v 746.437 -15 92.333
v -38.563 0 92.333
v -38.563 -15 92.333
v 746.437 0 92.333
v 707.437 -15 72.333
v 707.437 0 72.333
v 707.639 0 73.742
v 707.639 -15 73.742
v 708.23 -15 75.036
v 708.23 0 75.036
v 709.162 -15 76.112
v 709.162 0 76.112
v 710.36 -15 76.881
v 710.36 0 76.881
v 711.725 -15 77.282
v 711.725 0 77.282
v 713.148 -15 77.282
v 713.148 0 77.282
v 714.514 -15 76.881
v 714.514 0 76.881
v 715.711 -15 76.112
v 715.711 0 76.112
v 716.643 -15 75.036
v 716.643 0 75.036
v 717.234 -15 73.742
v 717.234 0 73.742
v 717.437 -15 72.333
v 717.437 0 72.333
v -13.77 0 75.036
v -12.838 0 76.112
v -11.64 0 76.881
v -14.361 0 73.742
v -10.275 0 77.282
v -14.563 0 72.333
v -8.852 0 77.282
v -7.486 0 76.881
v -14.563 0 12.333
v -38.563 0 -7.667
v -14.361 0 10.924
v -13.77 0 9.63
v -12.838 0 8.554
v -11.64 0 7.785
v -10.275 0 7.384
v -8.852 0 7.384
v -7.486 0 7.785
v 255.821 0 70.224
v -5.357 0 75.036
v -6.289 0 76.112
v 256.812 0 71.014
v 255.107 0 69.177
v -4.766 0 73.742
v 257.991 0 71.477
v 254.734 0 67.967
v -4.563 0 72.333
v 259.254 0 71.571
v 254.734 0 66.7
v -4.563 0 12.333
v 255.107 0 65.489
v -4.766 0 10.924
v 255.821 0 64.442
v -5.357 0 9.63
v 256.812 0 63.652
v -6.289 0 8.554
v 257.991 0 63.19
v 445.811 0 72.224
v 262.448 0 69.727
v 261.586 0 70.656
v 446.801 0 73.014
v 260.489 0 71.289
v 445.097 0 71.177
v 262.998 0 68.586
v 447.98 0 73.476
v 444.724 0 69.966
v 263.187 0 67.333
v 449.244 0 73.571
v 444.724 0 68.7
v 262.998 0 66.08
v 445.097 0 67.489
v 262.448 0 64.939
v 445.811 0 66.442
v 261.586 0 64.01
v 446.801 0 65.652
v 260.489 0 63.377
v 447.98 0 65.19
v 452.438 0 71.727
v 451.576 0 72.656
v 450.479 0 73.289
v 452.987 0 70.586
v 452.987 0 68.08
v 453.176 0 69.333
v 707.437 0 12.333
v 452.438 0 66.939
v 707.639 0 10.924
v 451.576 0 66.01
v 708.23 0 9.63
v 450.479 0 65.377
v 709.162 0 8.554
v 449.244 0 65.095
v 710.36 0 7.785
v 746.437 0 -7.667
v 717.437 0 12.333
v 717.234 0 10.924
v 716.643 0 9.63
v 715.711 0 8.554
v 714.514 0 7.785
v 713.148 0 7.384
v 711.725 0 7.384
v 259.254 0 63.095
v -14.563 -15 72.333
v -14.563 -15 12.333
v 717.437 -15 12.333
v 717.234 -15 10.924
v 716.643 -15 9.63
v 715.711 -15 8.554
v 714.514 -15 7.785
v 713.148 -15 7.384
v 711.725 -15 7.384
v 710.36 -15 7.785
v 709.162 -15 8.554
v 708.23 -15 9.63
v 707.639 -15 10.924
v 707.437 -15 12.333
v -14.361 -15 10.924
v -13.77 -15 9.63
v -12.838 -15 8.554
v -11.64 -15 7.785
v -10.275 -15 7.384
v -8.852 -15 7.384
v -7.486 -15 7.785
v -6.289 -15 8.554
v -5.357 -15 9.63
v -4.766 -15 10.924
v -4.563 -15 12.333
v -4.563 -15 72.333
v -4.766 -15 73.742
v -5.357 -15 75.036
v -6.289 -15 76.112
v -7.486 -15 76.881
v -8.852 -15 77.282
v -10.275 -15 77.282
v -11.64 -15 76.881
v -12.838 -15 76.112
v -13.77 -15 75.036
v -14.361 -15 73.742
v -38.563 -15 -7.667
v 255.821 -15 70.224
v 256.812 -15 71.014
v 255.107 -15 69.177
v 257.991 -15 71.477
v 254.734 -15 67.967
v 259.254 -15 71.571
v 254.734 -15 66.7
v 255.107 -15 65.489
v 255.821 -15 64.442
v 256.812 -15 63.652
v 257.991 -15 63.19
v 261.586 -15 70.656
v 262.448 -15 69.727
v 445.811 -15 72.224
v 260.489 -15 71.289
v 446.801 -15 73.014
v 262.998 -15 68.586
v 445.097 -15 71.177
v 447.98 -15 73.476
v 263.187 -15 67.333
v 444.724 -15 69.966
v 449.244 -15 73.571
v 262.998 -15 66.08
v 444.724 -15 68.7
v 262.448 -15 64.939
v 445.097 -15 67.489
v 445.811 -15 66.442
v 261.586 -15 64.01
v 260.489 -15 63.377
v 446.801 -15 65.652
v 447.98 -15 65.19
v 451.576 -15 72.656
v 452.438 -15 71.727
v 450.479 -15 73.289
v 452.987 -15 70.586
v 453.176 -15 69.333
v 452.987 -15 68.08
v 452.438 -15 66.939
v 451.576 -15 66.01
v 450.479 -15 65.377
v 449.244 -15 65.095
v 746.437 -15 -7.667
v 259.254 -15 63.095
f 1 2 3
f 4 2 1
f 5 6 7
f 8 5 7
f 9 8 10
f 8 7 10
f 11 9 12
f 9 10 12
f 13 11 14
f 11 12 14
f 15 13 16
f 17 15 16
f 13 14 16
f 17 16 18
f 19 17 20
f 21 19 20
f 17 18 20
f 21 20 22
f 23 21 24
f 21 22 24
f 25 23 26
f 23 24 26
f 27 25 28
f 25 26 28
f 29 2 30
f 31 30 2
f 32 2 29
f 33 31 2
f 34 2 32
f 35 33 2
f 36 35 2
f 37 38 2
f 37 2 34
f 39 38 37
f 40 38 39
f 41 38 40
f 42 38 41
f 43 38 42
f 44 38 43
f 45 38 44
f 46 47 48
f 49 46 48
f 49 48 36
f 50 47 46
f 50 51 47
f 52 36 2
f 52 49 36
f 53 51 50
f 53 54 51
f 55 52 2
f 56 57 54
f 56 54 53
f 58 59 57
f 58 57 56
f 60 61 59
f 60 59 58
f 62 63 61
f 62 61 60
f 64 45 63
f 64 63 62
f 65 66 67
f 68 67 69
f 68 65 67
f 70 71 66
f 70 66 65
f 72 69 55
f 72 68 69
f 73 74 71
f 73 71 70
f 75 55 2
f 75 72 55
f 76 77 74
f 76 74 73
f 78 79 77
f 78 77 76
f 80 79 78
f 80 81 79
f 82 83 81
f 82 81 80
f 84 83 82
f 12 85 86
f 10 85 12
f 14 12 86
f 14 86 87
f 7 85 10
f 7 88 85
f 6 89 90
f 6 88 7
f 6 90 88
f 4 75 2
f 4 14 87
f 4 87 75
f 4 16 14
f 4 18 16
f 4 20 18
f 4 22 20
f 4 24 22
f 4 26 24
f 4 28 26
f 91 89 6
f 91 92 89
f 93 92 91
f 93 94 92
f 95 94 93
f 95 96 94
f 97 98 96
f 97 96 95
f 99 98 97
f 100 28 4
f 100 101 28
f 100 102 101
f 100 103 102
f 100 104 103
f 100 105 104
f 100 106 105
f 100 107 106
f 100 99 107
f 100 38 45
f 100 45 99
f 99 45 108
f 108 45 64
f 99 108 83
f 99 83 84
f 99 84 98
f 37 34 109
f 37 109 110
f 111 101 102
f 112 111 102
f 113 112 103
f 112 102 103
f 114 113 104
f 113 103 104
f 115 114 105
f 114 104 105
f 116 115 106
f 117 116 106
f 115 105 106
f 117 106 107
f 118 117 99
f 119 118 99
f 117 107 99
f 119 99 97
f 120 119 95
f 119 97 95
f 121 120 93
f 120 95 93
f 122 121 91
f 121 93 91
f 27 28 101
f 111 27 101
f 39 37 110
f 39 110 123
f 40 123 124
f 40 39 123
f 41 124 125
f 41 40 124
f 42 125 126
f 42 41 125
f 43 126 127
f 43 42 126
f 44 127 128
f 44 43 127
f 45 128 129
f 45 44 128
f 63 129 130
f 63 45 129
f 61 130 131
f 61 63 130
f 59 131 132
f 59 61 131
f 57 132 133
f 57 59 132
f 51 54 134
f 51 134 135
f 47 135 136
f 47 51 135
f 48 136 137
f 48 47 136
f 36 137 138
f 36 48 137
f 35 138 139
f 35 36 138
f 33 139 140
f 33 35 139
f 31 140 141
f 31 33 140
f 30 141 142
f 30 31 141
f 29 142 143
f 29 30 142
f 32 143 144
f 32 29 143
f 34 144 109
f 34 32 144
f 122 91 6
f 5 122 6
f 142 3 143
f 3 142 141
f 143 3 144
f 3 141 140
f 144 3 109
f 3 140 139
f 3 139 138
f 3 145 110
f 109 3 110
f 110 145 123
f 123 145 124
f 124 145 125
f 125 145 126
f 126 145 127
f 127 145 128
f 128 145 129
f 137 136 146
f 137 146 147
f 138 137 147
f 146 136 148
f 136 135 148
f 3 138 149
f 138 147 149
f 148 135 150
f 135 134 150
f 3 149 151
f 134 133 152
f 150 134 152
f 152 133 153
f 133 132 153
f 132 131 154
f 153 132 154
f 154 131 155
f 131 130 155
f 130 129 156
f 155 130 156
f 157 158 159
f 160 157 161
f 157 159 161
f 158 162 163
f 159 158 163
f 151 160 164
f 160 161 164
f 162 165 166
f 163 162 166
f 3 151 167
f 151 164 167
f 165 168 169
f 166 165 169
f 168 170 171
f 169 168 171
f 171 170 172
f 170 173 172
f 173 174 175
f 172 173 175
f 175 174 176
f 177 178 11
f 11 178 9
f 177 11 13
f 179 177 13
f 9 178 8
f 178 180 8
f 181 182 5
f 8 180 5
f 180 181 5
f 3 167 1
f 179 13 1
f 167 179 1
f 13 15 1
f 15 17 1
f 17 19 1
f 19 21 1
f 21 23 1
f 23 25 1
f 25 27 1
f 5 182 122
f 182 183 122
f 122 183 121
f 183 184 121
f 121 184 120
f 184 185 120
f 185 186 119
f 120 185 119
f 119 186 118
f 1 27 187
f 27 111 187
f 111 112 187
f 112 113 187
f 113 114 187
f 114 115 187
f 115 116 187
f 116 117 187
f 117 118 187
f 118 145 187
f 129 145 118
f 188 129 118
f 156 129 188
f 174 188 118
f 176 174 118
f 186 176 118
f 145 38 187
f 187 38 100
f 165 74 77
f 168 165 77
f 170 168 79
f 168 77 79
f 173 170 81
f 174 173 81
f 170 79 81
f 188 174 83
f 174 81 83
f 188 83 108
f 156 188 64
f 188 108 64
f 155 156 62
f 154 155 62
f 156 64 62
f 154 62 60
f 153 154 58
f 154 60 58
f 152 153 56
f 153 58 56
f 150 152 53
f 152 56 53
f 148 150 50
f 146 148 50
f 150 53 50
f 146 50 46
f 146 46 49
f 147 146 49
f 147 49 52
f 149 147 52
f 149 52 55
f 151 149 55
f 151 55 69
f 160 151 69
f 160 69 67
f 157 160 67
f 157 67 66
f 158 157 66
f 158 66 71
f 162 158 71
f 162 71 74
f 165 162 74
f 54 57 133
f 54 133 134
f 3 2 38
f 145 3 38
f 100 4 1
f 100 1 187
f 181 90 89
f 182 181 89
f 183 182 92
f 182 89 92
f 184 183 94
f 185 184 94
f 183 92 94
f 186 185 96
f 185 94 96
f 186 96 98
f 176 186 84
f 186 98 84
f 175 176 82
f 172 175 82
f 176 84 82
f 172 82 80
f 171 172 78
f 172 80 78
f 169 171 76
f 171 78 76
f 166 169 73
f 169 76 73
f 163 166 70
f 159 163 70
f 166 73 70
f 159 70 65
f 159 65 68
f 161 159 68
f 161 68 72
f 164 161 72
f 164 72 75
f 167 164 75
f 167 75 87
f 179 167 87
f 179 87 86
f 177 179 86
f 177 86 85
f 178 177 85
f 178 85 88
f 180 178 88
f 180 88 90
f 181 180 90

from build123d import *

# Parameters (mm, degrees)
CROQUIS1_W              = 785
CROQUIS1_H              = 100
SALIENTE_EXTRUIR1_DEPTH = 15
CROQUIS5_R              = 4.25
CORTAR_EXTRUIR4_DEPTH   = 16
CORTAR_EXTRUIR5_DEPTH   = 16


with BuildPart() as part:
    # Croquis1 → Saliente-Extruir1 (new body)
    with BuildSketch(Plane(origin=(0, 0, 0), x_dir=(1, 0, 0), z_dir=(0, 1, 0))):
        with Locations((353.936588921, -42.333090379)):
            Rectangle(CROQUIS1_W, CROQUIS1_H)
    extrude(amount=-SALIENTE_EXTRUIR1_DEPTH)

    # Croquis5 → Cortar-Extruir4 (cut, through all)
    with BuildSketch(Plane(origin=(0, 0, 0), x_dir=(1, 0, 0), z_dir=(0, 1, 0))):
        with Locations((258.936588921, -67.333090379)):
            Circle(CROQUIS5_R)
        with Locations((448.92606348, -69.332979585)):
            Circle(CROQUIS5_R)
    extrude(amount=-CORTAR_EXTRUIR4_DEPTH, mode=Mode.SUBTRACT)

    # Croquis6 → Cortar-Extruir5 (cut, through all)
    with BuildSketch(Plane(origin=(0, 0, 0), x_dir=(1, 0, 0), z_dir=(0, 1, 0))):
        with BuildLine():
            Line((717.436588921, -72.333090379), (717.436588921, -12.333090379))
            ThreePointArc((717.436588921, -12.333090379), (712.436588921, -7.333090379), (707.436588921, -12.333090379))
            Line((707.436588921, -12.333090379), (707.436588921, -72.333090379))
            ThreePointArc((707.436588921, -72.333090379), (712.436588921, -77.333090379), (717.436588921, -72.333090379))
        make_face()
        with BuildLine():
            Line((-4.563411079, -12.333090379), (-4.563411079, -72.333090379))
            ThreePointArc((-4.563411079, -72.333090379), (-9.563411079, -77.333090379), (-14.563411079, -72.333090379))
            Line((-14.563411079, -72.333090379), (-14.563411079, -12.333090379))
            ThreePointArc((-14.563411079, -12.333090379), (-9.563411079, -7.333090379), (-4.563411079, -12.333090379))
        make_face()
    extrude(amount=-CORTAR_EXTRUIR5_DEPTH, mode=Mode.SUBTRACT)


solid = part.part
